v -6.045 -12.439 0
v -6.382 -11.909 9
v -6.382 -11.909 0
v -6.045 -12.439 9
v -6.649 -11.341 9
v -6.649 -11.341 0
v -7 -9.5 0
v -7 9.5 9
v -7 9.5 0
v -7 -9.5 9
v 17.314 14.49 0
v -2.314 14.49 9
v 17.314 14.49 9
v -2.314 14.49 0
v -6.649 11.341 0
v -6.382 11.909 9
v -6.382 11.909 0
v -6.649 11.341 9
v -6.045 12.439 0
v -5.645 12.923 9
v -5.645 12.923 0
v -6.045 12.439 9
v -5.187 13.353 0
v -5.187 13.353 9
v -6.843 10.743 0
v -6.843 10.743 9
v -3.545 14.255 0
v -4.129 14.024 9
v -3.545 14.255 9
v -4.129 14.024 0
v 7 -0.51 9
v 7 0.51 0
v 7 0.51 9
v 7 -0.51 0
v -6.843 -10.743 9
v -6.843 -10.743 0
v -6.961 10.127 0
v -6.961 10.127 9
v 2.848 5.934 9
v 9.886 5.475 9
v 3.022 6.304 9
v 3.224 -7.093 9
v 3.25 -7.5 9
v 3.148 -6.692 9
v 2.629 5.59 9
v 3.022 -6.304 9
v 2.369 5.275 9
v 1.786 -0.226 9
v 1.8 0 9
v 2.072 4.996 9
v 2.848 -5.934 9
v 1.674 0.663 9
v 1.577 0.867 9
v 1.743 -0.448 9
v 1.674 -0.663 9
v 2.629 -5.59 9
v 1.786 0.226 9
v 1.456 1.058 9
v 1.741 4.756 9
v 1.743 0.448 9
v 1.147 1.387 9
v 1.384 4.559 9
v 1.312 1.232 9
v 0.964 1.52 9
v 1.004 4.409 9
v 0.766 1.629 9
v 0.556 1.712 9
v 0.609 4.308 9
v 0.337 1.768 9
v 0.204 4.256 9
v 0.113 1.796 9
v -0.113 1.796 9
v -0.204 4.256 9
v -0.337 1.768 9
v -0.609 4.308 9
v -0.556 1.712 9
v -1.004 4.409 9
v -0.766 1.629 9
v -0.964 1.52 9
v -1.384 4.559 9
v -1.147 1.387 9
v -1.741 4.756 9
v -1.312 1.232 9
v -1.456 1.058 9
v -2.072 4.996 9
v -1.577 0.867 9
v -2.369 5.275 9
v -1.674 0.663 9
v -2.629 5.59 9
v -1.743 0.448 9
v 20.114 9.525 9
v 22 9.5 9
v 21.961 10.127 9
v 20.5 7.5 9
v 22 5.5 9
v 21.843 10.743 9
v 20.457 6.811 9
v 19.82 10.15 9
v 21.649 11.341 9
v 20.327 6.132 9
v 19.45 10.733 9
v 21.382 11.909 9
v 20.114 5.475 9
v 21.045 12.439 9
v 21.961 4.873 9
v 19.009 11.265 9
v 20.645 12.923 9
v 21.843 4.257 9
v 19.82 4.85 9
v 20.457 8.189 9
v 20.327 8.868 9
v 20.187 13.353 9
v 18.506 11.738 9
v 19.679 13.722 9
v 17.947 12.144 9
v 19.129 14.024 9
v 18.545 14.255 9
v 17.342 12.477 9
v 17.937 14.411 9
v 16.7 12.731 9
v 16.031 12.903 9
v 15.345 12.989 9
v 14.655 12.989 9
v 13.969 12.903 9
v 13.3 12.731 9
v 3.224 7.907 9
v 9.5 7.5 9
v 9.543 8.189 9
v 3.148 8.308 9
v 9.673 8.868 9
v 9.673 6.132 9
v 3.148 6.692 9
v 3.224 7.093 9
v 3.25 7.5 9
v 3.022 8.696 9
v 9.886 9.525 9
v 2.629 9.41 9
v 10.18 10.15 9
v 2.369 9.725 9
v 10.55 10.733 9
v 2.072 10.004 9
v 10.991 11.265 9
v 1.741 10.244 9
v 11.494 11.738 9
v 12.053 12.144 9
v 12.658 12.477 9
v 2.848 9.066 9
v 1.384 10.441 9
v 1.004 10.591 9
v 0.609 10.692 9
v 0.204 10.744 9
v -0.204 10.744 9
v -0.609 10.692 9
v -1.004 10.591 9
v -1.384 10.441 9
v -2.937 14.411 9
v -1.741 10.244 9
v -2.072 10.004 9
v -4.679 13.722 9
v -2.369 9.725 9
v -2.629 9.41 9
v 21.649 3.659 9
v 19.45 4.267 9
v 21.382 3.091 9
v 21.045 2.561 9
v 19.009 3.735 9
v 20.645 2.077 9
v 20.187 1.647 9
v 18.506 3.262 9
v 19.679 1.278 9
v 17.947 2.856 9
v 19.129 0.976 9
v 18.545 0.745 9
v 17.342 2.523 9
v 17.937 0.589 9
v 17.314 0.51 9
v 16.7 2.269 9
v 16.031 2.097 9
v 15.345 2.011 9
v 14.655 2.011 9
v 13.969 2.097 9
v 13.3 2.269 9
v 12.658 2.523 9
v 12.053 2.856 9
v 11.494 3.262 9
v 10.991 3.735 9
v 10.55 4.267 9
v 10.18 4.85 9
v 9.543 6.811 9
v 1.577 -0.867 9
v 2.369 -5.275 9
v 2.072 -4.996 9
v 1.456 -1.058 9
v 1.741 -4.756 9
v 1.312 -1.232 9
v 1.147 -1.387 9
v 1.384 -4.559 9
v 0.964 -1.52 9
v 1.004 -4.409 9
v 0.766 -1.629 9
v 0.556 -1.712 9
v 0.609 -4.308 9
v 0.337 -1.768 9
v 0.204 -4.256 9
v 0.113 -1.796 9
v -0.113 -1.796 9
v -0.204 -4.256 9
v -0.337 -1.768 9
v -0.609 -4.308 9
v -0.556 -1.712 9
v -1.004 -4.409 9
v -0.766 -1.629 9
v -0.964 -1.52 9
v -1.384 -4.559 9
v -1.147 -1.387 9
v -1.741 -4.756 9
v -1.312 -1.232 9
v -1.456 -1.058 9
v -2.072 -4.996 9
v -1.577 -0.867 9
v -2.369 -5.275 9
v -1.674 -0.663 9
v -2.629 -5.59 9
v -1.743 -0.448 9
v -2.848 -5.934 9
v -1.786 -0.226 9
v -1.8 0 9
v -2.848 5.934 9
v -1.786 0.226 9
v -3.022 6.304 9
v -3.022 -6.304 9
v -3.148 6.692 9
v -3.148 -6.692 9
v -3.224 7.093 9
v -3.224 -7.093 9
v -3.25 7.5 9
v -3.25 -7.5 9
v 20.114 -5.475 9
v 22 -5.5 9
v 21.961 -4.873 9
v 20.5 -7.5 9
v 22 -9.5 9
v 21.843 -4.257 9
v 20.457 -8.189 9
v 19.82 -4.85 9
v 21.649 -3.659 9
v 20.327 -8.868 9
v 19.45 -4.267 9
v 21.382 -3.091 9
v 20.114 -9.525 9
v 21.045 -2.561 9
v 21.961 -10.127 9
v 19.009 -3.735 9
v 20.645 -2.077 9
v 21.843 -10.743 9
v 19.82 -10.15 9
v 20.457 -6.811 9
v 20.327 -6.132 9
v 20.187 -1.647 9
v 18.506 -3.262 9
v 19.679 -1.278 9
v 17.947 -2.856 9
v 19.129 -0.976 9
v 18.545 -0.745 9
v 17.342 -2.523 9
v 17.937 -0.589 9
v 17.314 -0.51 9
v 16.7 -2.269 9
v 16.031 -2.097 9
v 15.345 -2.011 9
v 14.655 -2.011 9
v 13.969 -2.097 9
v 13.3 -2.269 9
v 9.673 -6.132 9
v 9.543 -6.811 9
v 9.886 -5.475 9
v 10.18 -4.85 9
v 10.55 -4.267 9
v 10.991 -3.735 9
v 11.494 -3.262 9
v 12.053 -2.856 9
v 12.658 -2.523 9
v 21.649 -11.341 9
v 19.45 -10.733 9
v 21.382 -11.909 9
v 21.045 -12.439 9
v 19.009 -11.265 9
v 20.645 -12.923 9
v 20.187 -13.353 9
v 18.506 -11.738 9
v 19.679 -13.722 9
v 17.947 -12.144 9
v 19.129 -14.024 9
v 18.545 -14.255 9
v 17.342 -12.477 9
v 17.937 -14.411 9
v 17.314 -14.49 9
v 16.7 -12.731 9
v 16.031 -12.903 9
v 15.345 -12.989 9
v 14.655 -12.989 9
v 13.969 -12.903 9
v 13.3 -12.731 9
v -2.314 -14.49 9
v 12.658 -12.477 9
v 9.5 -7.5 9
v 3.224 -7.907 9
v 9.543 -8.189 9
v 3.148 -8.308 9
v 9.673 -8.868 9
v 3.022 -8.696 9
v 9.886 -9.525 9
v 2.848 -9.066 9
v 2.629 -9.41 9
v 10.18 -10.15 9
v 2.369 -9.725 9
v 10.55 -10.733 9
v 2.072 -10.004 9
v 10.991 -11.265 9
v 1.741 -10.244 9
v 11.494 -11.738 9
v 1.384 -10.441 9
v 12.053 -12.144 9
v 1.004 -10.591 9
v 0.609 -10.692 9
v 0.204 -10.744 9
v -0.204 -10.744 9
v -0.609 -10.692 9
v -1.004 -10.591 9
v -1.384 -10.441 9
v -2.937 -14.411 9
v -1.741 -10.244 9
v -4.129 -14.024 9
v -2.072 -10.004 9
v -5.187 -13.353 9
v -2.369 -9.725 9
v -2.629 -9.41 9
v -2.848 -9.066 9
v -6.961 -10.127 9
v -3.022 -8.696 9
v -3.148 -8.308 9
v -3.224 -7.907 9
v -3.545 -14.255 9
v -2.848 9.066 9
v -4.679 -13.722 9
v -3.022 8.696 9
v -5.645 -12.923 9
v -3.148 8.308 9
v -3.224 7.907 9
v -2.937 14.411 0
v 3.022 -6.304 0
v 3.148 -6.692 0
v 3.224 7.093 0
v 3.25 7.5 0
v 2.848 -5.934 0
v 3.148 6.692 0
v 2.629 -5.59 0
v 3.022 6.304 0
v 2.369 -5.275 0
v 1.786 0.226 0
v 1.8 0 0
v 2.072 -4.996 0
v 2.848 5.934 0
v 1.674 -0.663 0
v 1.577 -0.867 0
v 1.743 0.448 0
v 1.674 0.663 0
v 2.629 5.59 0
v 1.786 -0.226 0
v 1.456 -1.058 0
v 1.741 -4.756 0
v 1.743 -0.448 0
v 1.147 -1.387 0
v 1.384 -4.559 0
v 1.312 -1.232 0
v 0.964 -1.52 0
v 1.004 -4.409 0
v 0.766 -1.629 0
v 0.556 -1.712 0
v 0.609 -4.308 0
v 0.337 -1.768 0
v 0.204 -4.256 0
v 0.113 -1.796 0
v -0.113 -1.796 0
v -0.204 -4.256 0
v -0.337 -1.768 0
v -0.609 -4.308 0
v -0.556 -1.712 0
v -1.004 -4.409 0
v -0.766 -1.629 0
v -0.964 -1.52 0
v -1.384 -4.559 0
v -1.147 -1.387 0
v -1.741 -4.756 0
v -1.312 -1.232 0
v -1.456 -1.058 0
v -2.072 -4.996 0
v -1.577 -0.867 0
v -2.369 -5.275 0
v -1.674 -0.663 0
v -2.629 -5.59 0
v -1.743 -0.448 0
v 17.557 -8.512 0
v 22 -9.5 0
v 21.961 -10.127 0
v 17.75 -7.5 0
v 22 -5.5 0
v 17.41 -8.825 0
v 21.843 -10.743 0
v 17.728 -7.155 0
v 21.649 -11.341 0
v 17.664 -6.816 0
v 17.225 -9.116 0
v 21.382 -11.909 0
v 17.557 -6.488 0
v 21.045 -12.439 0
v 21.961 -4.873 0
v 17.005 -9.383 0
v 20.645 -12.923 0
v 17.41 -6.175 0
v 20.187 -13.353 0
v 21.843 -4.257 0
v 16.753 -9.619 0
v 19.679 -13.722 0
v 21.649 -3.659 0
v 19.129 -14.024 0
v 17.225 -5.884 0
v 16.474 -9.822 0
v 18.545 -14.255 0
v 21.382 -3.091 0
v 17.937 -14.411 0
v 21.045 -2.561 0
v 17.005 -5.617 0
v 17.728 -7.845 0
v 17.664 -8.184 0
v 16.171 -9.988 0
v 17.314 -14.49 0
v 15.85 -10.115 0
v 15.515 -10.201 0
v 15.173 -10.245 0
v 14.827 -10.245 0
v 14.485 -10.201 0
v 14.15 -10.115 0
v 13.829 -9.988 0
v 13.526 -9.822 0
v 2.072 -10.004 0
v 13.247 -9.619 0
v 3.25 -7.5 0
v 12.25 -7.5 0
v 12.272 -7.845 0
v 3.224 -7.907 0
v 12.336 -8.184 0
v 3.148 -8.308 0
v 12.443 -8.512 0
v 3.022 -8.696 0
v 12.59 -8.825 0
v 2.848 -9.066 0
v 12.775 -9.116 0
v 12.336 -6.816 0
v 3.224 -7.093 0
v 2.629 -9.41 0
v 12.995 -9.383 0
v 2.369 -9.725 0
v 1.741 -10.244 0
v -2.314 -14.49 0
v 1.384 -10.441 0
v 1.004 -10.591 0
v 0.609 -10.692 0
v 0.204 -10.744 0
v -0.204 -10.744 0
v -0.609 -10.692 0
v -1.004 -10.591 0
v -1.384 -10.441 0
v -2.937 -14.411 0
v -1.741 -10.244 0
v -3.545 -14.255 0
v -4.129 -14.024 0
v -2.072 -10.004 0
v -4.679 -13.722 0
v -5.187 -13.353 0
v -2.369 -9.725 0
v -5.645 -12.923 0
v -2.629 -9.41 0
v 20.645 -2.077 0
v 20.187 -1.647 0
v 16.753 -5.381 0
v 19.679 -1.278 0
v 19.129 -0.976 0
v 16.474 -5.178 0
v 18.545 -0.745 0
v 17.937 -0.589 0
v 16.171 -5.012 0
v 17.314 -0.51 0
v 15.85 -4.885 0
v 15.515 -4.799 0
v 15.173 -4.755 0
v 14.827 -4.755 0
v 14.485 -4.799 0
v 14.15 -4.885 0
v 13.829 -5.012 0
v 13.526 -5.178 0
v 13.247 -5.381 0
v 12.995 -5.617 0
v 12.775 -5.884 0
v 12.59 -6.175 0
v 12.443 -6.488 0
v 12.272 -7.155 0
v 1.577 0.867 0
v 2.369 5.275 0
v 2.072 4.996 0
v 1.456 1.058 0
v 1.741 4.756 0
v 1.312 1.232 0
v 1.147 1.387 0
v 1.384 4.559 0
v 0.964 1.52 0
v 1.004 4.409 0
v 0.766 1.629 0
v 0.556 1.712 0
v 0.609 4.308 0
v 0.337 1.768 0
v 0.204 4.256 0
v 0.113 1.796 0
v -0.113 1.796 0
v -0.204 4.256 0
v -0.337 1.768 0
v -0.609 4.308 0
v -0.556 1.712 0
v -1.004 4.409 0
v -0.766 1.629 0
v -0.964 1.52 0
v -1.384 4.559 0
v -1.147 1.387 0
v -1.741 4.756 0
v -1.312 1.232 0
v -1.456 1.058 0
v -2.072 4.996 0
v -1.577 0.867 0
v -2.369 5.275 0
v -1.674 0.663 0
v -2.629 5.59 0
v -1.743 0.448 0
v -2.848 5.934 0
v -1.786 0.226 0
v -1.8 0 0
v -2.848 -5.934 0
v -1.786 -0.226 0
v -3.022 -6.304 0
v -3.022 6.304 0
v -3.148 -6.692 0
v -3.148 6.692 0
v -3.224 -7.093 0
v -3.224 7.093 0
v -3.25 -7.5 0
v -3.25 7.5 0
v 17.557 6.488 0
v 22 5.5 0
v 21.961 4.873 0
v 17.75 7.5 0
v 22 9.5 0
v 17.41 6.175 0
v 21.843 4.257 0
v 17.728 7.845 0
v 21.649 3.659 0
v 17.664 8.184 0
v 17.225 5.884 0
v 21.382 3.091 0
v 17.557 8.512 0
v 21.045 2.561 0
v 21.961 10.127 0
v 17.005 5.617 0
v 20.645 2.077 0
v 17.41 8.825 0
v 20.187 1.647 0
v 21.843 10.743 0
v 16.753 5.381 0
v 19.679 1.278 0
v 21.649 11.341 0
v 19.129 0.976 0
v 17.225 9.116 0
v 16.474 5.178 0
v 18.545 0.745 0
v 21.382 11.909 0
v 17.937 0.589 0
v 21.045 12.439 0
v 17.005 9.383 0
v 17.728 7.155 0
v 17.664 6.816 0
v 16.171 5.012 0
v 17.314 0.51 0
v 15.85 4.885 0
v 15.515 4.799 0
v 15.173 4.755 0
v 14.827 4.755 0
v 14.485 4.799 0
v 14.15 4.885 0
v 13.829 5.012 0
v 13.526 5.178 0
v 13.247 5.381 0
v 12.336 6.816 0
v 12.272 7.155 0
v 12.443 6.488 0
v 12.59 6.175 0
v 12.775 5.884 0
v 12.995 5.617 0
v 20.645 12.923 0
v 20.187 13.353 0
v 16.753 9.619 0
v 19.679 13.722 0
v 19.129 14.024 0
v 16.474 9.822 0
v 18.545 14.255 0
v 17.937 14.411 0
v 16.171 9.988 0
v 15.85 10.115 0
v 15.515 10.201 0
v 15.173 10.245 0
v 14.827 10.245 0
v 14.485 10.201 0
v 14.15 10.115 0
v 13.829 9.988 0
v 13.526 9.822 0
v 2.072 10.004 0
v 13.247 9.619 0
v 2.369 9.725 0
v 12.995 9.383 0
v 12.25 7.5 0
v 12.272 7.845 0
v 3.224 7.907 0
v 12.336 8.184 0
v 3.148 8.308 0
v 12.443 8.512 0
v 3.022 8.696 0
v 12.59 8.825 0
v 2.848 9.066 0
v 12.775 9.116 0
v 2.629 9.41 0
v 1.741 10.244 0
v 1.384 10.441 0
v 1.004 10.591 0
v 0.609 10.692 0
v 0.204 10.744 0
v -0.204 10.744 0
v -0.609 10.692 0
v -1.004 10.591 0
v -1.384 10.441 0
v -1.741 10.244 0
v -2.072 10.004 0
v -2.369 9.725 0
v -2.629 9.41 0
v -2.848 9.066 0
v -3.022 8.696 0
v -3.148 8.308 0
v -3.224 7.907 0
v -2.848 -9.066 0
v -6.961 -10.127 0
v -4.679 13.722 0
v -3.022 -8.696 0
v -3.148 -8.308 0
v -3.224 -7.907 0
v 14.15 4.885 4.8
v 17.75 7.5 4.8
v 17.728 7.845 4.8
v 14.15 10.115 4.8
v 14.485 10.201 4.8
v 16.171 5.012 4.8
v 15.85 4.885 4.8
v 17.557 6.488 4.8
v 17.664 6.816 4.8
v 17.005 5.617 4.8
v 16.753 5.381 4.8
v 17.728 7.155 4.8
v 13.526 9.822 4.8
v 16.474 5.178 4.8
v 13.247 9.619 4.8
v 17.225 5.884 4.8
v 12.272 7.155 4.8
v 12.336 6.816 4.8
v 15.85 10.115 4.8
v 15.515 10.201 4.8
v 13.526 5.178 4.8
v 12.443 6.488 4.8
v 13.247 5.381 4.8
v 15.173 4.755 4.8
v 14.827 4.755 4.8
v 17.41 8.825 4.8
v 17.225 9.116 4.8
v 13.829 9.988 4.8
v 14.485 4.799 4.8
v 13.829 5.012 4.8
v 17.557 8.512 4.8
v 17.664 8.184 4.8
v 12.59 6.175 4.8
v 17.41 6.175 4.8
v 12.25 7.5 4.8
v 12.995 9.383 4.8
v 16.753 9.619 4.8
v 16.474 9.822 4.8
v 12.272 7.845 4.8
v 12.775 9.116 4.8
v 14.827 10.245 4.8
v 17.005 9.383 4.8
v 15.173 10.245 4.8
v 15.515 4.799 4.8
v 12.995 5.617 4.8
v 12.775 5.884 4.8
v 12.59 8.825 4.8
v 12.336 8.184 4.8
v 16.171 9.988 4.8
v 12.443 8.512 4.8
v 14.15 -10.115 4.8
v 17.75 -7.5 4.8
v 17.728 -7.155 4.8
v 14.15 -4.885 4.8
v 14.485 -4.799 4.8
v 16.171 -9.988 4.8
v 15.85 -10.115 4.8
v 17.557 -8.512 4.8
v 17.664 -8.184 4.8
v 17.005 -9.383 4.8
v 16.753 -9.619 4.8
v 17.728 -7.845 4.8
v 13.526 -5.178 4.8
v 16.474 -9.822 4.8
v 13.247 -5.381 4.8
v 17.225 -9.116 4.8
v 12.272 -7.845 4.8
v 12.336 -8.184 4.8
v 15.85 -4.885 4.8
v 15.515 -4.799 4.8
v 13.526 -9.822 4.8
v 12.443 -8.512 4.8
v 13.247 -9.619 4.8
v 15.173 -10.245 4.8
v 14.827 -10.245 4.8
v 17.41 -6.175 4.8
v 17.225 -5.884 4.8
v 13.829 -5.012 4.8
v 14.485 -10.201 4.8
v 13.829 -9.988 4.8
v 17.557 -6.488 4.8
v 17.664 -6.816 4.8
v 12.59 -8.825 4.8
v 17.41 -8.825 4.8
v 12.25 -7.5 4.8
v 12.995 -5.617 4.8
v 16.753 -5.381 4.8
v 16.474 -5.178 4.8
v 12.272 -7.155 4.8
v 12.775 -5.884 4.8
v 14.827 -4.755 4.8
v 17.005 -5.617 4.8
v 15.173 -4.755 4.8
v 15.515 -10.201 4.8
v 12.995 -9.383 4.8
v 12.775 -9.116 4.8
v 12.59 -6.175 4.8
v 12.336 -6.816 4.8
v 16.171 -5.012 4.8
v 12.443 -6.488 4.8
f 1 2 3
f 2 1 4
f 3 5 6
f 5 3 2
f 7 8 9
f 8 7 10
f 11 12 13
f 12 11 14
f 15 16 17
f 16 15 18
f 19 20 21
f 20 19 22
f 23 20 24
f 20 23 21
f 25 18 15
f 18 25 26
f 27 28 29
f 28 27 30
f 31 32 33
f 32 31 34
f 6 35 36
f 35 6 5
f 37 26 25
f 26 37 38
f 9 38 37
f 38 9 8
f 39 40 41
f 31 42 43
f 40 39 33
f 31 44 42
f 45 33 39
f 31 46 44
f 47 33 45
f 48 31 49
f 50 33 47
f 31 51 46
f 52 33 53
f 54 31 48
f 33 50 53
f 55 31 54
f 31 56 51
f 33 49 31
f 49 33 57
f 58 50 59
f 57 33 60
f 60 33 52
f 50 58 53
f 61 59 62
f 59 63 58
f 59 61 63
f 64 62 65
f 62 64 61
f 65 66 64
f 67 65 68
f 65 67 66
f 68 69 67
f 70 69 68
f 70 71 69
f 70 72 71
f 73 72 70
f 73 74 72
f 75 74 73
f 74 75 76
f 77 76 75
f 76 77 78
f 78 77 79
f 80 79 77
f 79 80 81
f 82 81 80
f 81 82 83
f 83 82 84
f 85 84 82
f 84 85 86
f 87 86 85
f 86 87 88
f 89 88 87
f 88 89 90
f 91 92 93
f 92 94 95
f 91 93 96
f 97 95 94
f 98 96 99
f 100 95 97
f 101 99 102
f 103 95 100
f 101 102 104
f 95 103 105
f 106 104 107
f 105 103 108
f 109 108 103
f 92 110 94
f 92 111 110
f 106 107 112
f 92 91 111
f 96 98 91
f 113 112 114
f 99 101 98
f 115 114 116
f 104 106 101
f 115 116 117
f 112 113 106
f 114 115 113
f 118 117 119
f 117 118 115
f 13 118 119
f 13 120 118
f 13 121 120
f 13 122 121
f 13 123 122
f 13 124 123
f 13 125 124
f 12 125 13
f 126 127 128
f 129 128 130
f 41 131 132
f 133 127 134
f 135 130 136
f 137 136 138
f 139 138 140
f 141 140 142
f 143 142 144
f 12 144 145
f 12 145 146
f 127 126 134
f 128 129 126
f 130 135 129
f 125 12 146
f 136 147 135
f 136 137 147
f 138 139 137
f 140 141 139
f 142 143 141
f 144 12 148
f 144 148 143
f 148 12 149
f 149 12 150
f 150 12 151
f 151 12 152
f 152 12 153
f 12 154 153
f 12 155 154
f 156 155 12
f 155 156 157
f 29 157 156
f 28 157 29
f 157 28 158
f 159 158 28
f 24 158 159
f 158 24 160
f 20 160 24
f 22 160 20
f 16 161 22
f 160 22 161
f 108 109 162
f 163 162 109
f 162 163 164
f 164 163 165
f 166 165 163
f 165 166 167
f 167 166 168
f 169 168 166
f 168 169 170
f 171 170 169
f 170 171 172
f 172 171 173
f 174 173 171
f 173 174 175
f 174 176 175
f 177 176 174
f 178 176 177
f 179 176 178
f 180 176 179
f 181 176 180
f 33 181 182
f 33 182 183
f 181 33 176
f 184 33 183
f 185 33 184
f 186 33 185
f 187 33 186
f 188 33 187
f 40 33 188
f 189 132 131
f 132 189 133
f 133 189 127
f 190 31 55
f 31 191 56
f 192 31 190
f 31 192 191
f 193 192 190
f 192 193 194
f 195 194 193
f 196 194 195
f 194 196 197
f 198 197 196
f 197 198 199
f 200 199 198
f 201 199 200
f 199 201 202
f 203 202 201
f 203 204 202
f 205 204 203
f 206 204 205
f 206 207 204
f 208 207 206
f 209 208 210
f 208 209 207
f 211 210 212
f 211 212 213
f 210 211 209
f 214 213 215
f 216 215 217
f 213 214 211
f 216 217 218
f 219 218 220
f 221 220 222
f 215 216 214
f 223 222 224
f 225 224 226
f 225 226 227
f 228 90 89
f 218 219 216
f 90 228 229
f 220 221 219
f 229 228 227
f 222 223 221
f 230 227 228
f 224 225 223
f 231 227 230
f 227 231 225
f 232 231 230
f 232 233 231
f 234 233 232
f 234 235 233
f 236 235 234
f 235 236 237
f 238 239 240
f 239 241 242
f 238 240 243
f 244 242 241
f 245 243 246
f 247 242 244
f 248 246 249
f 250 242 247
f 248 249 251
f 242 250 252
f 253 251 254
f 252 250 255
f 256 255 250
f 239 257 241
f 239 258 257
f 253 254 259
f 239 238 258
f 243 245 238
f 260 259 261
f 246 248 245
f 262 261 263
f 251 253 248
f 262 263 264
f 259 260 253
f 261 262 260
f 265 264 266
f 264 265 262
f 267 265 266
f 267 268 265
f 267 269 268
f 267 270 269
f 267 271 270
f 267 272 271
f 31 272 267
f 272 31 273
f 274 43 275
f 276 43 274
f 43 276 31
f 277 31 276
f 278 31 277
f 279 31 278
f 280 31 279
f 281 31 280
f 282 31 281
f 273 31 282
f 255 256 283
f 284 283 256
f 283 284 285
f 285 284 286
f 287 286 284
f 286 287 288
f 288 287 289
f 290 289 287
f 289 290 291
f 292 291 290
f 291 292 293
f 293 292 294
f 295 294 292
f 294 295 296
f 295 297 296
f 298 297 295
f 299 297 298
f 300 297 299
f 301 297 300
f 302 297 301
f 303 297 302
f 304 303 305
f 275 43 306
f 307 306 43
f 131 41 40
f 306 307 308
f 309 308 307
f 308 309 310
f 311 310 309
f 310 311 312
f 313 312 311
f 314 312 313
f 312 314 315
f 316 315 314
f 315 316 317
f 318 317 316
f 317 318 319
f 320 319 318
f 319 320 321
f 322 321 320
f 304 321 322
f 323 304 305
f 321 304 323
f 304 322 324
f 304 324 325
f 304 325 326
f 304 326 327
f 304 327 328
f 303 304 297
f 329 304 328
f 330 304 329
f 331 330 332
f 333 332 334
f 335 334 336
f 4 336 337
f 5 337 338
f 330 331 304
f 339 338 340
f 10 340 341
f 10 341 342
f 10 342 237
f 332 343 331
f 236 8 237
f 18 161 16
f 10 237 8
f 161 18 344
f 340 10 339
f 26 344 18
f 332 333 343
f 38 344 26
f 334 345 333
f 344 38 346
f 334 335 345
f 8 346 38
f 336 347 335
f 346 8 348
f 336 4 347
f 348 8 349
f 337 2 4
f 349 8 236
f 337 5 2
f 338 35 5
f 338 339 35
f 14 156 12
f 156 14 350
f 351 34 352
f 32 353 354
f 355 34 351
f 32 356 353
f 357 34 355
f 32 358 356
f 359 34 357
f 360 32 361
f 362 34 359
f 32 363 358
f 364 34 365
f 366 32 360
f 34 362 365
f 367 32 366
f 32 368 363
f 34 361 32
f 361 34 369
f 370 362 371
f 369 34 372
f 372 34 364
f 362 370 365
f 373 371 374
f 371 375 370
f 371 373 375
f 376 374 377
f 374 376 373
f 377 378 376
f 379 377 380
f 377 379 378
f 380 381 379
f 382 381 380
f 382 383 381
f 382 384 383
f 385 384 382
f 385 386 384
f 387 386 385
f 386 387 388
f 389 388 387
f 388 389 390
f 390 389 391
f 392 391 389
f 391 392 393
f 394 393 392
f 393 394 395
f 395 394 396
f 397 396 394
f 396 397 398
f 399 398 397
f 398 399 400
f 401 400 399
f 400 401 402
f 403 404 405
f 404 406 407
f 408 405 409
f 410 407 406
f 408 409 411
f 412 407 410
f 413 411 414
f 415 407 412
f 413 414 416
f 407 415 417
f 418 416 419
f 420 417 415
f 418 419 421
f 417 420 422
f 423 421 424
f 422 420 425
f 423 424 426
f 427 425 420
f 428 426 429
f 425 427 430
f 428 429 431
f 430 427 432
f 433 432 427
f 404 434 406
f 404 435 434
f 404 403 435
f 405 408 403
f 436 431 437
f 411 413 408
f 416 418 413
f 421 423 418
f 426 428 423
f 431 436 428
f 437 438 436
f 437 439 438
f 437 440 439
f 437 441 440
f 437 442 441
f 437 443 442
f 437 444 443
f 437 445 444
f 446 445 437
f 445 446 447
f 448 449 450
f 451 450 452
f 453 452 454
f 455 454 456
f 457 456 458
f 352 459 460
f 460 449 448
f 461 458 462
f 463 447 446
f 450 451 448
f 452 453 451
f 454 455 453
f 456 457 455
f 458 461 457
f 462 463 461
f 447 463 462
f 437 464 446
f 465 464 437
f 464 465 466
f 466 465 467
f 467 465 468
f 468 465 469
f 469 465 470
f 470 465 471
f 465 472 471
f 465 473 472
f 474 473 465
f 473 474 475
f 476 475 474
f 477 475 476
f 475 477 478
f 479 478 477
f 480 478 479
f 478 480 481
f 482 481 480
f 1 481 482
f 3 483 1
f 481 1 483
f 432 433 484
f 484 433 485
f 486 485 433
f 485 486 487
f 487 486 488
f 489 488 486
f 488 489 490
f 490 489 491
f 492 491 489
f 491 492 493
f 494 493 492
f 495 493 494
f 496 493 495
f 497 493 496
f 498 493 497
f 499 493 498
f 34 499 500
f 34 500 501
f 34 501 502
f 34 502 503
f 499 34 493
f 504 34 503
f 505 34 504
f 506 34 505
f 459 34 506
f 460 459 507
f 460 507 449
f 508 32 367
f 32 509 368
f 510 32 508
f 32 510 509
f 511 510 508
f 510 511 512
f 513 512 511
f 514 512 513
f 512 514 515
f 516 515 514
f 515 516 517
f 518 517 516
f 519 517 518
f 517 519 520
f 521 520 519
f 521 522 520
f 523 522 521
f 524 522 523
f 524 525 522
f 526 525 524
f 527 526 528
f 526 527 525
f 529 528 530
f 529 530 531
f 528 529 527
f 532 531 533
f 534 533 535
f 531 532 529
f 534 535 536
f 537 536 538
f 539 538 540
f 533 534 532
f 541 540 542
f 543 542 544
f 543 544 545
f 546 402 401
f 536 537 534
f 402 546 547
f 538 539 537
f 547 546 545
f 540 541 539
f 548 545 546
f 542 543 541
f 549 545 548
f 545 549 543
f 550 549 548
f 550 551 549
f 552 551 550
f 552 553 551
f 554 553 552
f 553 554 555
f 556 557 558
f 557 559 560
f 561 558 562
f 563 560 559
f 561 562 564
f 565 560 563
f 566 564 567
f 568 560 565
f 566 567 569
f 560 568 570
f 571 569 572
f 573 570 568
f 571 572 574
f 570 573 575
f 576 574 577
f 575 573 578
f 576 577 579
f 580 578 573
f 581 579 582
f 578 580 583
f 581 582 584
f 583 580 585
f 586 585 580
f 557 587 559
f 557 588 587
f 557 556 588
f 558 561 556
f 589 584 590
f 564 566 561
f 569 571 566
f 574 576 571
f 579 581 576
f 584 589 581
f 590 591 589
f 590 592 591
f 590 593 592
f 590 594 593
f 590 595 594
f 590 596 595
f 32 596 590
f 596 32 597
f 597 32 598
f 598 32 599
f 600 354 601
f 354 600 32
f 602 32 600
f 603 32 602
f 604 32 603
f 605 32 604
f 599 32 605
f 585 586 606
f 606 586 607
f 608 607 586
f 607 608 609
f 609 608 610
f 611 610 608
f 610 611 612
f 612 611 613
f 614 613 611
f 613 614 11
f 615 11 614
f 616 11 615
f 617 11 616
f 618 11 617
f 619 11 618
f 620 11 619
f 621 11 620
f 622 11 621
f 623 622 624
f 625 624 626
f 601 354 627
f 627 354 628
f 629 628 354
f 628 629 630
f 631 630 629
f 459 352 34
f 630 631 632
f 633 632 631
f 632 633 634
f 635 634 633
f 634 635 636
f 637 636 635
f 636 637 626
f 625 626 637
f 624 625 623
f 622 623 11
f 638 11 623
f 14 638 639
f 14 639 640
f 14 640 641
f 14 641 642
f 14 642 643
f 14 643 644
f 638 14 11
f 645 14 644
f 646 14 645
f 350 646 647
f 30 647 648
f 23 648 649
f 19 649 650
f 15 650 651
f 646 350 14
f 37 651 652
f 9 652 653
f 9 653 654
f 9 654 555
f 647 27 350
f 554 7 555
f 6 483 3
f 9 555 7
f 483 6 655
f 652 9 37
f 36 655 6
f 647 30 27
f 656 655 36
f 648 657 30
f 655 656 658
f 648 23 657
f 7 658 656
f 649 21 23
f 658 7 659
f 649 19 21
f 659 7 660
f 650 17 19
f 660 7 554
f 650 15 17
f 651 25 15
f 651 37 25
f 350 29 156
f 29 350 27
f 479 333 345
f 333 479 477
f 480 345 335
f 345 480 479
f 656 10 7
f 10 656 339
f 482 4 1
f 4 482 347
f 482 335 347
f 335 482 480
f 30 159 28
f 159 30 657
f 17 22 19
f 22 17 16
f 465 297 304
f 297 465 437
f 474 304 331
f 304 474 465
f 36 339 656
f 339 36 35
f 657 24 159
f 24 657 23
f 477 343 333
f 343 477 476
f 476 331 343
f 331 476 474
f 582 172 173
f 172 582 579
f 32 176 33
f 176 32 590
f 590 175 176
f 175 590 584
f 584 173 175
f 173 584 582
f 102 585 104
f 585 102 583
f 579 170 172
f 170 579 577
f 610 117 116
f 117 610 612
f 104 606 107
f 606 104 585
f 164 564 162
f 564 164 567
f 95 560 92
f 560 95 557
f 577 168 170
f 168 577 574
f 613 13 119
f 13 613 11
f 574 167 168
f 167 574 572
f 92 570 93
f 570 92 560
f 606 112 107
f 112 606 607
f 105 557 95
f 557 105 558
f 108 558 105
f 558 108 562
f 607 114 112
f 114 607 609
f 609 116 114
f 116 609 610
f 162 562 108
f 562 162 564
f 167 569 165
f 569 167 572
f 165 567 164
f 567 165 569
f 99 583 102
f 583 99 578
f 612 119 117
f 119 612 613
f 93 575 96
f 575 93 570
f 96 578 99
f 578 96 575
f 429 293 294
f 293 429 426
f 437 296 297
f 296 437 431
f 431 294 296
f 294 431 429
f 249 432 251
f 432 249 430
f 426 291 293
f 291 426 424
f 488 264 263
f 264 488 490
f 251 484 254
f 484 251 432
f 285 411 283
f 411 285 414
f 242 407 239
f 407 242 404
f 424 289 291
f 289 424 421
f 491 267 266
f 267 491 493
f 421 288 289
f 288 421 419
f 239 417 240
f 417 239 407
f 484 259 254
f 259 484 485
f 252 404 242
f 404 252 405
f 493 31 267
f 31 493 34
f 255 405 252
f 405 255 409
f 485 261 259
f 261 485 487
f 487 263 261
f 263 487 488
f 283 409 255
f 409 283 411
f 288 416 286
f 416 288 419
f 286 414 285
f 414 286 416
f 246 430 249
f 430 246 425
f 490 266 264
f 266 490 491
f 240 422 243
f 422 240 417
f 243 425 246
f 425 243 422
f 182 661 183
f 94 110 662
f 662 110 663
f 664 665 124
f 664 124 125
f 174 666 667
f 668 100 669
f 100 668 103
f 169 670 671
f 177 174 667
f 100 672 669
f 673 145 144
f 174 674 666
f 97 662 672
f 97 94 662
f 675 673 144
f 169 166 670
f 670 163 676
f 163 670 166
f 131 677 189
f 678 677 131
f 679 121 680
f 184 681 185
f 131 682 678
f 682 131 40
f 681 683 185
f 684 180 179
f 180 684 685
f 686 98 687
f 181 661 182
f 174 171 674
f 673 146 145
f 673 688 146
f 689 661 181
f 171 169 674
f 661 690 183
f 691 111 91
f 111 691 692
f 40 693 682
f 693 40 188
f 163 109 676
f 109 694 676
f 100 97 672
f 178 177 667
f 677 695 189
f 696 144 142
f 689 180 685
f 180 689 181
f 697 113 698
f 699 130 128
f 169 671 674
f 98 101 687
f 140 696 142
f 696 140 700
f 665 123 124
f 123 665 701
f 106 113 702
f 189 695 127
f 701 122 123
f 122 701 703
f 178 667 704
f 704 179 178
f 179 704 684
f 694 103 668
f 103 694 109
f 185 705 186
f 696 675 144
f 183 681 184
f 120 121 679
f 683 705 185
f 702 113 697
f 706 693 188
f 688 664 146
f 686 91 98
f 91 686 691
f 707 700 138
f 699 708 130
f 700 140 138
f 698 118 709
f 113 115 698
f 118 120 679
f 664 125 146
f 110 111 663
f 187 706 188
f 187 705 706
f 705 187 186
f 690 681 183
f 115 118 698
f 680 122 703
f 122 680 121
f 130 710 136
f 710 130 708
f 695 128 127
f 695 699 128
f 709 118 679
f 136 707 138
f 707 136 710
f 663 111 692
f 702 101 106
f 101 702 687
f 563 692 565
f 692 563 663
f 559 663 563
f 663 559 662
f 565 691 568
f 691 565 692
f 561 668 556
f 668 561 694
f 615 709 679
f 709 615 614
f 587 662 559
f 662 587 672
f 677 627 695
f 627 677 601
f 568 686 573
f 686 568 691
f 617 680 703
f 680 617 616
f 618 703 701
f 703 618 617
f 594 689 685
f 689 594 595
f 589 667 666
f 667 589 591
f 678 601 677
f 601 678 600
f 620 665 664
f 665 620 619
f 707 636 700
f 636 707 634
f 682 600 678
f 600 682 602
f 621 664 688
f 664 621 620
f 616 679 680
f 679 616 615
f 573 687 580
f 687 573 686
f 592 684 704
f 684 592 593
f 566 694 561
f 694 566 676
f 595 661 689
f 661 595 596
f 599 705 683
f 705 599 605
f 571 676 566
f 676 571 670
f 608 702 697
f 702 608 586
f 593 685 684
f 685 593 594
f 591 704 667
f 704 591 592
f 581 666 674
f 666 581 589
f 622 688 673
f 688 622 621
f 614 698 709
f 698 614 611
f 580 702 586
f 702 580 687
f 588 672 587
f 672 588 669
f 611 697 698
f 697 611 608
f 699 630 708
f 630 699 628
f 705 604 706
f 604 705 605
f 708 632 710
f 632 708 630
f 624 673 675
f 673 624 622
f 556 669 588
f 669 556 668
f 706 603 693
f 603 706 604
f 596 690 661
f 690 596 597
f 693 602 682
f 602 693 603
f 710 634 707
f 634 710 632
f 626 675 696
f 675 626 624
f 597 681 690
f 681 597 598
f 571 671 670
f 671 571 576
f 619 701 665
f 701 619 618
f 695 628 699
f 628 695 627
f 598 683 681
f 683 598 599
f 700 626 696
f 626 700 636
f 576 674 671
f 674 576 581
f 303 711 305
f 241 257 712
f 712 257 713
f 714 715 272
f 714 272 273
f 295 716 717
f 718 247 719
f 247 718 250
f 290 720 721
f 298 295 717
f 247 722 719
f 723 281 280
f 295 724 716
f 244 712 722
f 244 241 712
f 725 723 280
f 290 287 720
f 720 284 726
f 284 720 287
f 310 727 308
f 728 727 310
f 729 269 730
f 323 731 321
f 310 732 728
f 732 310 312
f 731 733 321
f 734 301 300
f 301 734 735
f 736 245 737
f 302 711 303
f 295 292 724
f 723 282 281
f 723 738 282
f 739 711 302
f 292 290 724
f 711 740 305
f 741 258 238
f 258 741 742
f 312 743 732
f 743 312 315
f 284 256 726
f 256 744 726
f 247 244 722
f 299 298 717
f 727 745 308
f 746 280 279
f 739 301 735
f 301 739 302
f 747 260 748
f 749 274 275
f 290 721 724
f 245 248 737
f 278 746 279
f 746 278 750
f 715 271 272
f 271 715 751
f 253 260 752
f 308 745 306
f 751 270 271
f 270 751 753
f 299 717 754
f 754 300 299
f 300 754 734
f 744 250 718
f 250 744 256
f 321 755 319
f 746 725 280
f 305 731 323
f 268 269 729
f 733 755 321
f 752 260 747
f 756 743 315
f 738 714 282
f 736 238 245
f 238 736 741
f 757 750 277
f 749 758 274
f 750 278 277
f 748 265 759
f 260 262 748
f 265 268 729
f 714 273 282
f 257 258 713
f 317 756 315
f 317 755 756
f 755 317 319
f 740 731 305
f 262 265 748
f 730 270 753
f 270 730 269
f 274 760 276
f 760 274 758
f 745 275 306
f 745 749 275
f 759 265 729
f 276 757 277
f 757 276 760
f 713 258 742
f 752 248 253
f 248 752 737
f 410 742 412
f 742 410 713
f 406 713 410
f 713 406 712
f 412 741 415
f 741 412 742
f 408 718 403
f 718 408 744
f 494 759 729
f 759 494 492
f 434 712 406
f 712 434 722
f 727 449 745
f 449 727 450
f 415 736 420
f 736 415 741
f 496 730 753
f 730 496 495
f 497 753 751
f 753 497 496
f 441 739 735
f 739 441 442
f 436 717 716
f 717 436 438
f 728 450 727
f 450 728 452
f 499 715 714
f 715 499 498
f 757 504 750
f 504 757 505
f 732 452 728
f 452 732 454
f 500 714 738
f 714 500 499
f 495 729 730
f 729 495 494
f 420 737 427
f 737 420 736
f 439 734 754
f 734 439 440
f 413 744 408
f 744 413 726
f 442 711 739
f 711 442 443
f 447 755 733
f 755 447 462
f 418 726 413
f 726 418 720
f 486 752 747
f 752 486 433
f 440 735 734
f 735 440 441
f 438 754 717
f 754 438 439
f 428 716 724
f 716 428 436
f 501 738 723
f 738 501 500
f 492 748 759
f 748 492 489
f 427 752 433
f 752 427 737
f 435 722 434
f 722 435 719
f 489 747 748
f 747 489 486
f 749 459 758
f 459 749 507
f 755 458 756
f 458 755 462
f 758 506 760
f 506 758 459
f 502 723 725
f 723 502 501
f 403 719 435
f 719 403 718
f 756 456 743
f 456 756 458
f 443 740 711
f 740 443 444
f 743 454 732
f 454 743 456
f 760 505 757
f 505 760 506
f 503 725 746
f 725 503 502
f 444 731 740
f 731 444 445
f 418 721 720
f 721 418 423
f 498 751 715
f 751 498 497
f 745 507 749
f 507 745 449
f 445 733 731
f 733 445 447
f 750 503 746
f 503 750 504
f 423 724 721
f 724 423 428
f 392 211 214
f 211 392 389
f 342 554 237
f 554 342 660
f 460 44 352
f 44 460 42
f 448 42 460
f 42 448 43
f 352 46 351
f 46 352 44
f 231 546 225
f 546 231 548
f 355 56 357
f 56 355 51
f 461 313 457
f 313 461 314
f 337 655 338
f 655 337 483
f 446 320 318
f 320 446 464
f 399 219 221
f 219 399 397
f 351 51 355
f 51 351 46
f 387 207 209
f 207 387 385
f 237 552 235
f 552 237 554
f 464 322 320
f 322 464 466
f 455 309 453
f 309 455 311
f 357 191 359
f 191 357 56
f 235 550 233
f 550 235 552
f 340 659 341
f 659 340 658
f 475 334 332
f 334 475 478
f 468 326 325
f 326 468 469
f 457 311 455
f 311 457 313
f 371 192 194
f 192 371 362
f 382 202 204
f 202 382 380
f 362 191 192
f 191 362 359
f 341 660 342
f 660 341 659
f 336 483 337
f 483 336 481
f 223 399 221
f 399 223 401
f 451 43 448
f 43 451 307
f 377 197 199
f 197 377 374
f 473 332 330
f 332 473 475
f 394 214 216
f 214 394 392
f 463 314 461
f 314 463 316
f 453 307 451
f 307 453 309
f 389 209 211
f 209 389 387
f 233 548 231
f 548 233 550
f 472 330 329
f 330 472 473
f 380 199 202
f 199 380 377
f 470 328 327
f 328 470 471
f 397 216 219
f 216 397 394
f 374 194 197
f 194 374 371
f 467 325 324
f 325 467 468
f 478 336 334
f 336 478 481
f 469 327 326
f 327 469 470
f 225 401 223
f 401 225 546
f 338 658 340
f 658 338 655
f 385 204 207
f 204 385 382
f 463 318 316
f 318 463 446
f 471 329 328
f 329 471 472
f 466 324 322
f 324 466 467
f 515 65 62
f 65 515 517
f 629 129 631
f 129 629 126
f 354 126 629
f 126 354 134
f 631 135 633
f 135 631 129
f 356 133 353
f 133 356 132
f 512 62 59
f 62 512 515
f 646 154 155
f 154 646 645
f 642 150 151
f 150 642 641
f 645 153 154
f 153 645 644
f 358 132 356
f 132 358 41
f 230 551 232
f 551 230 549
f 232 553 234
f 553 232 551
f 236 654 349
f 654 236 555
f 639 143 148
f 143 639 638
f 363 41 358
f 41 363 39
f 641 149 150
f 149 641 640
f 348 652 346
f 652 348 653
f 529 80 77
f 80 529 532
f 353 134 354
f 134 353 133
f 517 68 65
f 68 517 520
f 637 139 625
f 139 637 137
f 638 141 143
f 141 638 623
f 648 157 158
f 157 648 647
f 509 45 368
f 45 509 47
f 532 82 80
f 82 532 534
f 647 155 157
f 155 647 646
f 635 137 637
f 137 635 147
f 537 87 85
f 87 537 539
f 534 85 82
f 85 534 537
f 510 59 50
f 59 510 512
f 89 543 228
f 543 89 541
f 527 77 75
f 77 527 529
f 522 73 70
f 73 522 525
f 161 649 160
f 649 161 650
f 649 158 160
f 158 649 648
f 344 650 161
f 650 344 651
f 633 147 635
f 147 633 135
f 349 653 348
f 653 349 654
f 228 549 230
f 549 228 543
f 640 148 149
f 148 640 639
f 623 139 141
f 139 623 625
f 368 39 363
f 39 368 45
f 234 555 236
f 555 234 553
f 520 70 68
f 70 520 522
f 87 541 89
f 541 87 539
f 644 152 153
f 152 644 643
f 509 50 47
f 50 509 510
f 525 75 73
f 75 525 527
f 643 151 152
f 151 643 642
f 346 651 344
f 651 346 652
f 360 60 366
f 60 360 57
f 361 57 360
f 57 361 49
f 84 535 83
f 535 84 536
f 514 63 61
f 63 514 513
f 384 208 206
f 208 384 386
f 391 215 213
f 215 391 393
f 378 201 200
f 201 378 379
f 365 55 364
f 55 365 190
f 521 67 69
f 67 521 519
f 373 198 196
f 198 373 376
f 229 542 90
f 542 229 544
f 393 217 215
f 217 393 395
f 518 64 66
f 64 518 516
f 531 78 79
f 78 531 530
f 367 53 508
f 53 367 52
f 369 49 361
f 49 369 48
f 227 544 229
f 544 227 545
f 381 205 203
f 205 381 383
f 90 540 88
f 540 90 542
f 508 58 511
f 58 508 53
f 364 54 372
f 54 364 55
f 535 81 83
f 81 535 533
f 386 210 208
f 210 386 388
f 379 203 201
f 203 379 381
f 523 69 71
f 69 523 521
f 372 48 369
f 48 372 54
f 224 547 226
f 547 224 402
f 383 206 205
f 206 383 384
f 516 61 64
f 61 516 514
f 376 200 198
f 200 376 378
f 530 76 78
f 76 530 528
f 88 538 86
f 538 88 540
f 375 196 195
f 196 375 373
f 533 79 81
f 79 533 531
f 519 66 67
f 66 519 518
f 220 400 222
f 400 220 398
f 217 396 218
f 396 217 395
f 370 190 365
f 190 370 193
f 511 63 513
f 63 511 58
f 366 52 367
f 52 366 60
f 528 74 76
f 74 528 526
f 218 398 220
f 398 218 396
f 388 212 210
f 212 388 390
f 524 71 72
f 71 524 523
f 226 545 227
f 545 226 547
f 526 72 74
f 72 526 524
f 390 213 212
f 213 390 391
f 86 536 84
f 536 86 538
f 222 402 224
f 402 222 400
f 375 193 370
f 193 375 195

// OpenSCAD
$fn = 50;


difference() {
	union() {
		hull() {
			translate(v = [-2.0000000000, 9.5000000000, 0]) {
				cylinder(h = 9, r = 5);
			}
			translate(v = [2.0000000000, 9.5000000000, 0]) {
				cylinder(h = 9, r = 5);
			}
			translate(v = [-2.0000000000, -9.5000000000, 0]) {
				cylinder(h = 9, r = 5);
			}
			translate(v = [2.0000000000, -9.5000000000, 0]) {
				cylinder(h = 9, r = 5);
			}
		}
		translate(v = [7.5000000000, 7.5000000000, 0]) {
			hull() {
				translate(v = [-9.5000000000, 2.0000000000, 0]) {
					cylinder(h = 9, r = 5);
				}
				translate(v = [9.5000000000, 2.0000000000, 0]) {
					cylinder(h = 9, r = 5);
				}
				translate(v = [-9.5000000000, -2.0000000000, 0]) {
					cylinder(h = 9, r = 5);
				}
				translate(v = [9.5000000000, -2.0000000000, 0]) {
					cylinder(h = 9, r = 5);
				}
			}
		}
		translate(v = [7.5000000000, -7.5000000000, 0]) {
			hull() {
				translate(v = [-9.5000000000, 2.0000000000, 0]) {
					cylinder(h = 9, r = 5);
				}
				translate(v = [9.5000000000, 2.0000000000, 0]) {
					cylinder(h = 9, r = 5);
				}
				translate(v = [-9.5000000000, -2.0000000000, 0]) {
					cylinder(h = 9, r = 5);
				}
				translate(v = [9.5000000000, -2.0000000000, 0]) {
					cylinder(h = 9, r = 5);
				}
			}
		}
	}
	union() {
		translate(v = [15.0000000000, 7.5000000000, 9]) {
			rotate(a = [0, 0, 0]) {
				difference() {
					union() {
						#translate(v = [0, 0, -9.0000000000]) {
							cylinder(h = 9, r = 2.2500000000);
						}
						#translate(v = [0, 0, -4.2000000000]) {
							cylinder(h = 4.2000000000, r1 = 2.7500000000, r2 = 5.5000000000);
						}
						#translate(v = [0, 0, -9.0000000000]) {
							cylinder(h = 9, r = 2.7500000000);
						}
						#translate(v = [0, 0, -9.0000000000]) {
							cylinder(h = 9, r = 2.2500000000);
						}
					}
					union();
				}
			}
		}
		translate(v = [15.0000000000, -7.5000000000, 9]) {
			rotate(a = [0, 0, 0]) {
				difference() {
					union() {
						#translate(v = [0, 0, -9.0000000000]) {
							cylinder(h = 9, r = 2.2500000000);
						}
						#translate(v = [0, 0, -4.2000000000]) {
							cylinder(h = 4.2000000000, r1 = 2.7500000000, r2 = 5.5000000000);
						}
						#translate(v = [0, 0, -9.0000000000]) {
							cylinder(h = 9, r = 2.7500000000);
						}
						#translate(v = [0, 0, -9.0000000000]) {
							cylinder(h = 9, r = 2.2500000000);
						}
					}
					union();
				}
			}
		}
		translate(v = [0.0000000000, -7.5000000000, 0]) {
			translate(v = [0, 0, -100]) {
				cylinder(h = 200, r = 3.2500000000);
			}
		}
		translate(v = [0.0000000000, 7.5000000000, 0]) {
			translate(v = [0, 0, -100]) {
				cylinder(h = 200, r = 3.2500000000);
			}
		}
		translate(v = [0.0000000000, -7.5000000000, 0]) {
			translate(v = [0, 0, -100]) {
				cylinder(h = 200, r = 1.8000000000);
			}
		}
		translate(v = [0, 0, -100]) {
			cylinder(h = 200, r = 1.8000000000);
		}
		translate(v = [0.0000000000, 7.5000000000, 0]) {
			translate(v = [0, 0, -100]) {
				cylinder(h = 200, r = 1.8000000000);
			}
		}
	}
}
